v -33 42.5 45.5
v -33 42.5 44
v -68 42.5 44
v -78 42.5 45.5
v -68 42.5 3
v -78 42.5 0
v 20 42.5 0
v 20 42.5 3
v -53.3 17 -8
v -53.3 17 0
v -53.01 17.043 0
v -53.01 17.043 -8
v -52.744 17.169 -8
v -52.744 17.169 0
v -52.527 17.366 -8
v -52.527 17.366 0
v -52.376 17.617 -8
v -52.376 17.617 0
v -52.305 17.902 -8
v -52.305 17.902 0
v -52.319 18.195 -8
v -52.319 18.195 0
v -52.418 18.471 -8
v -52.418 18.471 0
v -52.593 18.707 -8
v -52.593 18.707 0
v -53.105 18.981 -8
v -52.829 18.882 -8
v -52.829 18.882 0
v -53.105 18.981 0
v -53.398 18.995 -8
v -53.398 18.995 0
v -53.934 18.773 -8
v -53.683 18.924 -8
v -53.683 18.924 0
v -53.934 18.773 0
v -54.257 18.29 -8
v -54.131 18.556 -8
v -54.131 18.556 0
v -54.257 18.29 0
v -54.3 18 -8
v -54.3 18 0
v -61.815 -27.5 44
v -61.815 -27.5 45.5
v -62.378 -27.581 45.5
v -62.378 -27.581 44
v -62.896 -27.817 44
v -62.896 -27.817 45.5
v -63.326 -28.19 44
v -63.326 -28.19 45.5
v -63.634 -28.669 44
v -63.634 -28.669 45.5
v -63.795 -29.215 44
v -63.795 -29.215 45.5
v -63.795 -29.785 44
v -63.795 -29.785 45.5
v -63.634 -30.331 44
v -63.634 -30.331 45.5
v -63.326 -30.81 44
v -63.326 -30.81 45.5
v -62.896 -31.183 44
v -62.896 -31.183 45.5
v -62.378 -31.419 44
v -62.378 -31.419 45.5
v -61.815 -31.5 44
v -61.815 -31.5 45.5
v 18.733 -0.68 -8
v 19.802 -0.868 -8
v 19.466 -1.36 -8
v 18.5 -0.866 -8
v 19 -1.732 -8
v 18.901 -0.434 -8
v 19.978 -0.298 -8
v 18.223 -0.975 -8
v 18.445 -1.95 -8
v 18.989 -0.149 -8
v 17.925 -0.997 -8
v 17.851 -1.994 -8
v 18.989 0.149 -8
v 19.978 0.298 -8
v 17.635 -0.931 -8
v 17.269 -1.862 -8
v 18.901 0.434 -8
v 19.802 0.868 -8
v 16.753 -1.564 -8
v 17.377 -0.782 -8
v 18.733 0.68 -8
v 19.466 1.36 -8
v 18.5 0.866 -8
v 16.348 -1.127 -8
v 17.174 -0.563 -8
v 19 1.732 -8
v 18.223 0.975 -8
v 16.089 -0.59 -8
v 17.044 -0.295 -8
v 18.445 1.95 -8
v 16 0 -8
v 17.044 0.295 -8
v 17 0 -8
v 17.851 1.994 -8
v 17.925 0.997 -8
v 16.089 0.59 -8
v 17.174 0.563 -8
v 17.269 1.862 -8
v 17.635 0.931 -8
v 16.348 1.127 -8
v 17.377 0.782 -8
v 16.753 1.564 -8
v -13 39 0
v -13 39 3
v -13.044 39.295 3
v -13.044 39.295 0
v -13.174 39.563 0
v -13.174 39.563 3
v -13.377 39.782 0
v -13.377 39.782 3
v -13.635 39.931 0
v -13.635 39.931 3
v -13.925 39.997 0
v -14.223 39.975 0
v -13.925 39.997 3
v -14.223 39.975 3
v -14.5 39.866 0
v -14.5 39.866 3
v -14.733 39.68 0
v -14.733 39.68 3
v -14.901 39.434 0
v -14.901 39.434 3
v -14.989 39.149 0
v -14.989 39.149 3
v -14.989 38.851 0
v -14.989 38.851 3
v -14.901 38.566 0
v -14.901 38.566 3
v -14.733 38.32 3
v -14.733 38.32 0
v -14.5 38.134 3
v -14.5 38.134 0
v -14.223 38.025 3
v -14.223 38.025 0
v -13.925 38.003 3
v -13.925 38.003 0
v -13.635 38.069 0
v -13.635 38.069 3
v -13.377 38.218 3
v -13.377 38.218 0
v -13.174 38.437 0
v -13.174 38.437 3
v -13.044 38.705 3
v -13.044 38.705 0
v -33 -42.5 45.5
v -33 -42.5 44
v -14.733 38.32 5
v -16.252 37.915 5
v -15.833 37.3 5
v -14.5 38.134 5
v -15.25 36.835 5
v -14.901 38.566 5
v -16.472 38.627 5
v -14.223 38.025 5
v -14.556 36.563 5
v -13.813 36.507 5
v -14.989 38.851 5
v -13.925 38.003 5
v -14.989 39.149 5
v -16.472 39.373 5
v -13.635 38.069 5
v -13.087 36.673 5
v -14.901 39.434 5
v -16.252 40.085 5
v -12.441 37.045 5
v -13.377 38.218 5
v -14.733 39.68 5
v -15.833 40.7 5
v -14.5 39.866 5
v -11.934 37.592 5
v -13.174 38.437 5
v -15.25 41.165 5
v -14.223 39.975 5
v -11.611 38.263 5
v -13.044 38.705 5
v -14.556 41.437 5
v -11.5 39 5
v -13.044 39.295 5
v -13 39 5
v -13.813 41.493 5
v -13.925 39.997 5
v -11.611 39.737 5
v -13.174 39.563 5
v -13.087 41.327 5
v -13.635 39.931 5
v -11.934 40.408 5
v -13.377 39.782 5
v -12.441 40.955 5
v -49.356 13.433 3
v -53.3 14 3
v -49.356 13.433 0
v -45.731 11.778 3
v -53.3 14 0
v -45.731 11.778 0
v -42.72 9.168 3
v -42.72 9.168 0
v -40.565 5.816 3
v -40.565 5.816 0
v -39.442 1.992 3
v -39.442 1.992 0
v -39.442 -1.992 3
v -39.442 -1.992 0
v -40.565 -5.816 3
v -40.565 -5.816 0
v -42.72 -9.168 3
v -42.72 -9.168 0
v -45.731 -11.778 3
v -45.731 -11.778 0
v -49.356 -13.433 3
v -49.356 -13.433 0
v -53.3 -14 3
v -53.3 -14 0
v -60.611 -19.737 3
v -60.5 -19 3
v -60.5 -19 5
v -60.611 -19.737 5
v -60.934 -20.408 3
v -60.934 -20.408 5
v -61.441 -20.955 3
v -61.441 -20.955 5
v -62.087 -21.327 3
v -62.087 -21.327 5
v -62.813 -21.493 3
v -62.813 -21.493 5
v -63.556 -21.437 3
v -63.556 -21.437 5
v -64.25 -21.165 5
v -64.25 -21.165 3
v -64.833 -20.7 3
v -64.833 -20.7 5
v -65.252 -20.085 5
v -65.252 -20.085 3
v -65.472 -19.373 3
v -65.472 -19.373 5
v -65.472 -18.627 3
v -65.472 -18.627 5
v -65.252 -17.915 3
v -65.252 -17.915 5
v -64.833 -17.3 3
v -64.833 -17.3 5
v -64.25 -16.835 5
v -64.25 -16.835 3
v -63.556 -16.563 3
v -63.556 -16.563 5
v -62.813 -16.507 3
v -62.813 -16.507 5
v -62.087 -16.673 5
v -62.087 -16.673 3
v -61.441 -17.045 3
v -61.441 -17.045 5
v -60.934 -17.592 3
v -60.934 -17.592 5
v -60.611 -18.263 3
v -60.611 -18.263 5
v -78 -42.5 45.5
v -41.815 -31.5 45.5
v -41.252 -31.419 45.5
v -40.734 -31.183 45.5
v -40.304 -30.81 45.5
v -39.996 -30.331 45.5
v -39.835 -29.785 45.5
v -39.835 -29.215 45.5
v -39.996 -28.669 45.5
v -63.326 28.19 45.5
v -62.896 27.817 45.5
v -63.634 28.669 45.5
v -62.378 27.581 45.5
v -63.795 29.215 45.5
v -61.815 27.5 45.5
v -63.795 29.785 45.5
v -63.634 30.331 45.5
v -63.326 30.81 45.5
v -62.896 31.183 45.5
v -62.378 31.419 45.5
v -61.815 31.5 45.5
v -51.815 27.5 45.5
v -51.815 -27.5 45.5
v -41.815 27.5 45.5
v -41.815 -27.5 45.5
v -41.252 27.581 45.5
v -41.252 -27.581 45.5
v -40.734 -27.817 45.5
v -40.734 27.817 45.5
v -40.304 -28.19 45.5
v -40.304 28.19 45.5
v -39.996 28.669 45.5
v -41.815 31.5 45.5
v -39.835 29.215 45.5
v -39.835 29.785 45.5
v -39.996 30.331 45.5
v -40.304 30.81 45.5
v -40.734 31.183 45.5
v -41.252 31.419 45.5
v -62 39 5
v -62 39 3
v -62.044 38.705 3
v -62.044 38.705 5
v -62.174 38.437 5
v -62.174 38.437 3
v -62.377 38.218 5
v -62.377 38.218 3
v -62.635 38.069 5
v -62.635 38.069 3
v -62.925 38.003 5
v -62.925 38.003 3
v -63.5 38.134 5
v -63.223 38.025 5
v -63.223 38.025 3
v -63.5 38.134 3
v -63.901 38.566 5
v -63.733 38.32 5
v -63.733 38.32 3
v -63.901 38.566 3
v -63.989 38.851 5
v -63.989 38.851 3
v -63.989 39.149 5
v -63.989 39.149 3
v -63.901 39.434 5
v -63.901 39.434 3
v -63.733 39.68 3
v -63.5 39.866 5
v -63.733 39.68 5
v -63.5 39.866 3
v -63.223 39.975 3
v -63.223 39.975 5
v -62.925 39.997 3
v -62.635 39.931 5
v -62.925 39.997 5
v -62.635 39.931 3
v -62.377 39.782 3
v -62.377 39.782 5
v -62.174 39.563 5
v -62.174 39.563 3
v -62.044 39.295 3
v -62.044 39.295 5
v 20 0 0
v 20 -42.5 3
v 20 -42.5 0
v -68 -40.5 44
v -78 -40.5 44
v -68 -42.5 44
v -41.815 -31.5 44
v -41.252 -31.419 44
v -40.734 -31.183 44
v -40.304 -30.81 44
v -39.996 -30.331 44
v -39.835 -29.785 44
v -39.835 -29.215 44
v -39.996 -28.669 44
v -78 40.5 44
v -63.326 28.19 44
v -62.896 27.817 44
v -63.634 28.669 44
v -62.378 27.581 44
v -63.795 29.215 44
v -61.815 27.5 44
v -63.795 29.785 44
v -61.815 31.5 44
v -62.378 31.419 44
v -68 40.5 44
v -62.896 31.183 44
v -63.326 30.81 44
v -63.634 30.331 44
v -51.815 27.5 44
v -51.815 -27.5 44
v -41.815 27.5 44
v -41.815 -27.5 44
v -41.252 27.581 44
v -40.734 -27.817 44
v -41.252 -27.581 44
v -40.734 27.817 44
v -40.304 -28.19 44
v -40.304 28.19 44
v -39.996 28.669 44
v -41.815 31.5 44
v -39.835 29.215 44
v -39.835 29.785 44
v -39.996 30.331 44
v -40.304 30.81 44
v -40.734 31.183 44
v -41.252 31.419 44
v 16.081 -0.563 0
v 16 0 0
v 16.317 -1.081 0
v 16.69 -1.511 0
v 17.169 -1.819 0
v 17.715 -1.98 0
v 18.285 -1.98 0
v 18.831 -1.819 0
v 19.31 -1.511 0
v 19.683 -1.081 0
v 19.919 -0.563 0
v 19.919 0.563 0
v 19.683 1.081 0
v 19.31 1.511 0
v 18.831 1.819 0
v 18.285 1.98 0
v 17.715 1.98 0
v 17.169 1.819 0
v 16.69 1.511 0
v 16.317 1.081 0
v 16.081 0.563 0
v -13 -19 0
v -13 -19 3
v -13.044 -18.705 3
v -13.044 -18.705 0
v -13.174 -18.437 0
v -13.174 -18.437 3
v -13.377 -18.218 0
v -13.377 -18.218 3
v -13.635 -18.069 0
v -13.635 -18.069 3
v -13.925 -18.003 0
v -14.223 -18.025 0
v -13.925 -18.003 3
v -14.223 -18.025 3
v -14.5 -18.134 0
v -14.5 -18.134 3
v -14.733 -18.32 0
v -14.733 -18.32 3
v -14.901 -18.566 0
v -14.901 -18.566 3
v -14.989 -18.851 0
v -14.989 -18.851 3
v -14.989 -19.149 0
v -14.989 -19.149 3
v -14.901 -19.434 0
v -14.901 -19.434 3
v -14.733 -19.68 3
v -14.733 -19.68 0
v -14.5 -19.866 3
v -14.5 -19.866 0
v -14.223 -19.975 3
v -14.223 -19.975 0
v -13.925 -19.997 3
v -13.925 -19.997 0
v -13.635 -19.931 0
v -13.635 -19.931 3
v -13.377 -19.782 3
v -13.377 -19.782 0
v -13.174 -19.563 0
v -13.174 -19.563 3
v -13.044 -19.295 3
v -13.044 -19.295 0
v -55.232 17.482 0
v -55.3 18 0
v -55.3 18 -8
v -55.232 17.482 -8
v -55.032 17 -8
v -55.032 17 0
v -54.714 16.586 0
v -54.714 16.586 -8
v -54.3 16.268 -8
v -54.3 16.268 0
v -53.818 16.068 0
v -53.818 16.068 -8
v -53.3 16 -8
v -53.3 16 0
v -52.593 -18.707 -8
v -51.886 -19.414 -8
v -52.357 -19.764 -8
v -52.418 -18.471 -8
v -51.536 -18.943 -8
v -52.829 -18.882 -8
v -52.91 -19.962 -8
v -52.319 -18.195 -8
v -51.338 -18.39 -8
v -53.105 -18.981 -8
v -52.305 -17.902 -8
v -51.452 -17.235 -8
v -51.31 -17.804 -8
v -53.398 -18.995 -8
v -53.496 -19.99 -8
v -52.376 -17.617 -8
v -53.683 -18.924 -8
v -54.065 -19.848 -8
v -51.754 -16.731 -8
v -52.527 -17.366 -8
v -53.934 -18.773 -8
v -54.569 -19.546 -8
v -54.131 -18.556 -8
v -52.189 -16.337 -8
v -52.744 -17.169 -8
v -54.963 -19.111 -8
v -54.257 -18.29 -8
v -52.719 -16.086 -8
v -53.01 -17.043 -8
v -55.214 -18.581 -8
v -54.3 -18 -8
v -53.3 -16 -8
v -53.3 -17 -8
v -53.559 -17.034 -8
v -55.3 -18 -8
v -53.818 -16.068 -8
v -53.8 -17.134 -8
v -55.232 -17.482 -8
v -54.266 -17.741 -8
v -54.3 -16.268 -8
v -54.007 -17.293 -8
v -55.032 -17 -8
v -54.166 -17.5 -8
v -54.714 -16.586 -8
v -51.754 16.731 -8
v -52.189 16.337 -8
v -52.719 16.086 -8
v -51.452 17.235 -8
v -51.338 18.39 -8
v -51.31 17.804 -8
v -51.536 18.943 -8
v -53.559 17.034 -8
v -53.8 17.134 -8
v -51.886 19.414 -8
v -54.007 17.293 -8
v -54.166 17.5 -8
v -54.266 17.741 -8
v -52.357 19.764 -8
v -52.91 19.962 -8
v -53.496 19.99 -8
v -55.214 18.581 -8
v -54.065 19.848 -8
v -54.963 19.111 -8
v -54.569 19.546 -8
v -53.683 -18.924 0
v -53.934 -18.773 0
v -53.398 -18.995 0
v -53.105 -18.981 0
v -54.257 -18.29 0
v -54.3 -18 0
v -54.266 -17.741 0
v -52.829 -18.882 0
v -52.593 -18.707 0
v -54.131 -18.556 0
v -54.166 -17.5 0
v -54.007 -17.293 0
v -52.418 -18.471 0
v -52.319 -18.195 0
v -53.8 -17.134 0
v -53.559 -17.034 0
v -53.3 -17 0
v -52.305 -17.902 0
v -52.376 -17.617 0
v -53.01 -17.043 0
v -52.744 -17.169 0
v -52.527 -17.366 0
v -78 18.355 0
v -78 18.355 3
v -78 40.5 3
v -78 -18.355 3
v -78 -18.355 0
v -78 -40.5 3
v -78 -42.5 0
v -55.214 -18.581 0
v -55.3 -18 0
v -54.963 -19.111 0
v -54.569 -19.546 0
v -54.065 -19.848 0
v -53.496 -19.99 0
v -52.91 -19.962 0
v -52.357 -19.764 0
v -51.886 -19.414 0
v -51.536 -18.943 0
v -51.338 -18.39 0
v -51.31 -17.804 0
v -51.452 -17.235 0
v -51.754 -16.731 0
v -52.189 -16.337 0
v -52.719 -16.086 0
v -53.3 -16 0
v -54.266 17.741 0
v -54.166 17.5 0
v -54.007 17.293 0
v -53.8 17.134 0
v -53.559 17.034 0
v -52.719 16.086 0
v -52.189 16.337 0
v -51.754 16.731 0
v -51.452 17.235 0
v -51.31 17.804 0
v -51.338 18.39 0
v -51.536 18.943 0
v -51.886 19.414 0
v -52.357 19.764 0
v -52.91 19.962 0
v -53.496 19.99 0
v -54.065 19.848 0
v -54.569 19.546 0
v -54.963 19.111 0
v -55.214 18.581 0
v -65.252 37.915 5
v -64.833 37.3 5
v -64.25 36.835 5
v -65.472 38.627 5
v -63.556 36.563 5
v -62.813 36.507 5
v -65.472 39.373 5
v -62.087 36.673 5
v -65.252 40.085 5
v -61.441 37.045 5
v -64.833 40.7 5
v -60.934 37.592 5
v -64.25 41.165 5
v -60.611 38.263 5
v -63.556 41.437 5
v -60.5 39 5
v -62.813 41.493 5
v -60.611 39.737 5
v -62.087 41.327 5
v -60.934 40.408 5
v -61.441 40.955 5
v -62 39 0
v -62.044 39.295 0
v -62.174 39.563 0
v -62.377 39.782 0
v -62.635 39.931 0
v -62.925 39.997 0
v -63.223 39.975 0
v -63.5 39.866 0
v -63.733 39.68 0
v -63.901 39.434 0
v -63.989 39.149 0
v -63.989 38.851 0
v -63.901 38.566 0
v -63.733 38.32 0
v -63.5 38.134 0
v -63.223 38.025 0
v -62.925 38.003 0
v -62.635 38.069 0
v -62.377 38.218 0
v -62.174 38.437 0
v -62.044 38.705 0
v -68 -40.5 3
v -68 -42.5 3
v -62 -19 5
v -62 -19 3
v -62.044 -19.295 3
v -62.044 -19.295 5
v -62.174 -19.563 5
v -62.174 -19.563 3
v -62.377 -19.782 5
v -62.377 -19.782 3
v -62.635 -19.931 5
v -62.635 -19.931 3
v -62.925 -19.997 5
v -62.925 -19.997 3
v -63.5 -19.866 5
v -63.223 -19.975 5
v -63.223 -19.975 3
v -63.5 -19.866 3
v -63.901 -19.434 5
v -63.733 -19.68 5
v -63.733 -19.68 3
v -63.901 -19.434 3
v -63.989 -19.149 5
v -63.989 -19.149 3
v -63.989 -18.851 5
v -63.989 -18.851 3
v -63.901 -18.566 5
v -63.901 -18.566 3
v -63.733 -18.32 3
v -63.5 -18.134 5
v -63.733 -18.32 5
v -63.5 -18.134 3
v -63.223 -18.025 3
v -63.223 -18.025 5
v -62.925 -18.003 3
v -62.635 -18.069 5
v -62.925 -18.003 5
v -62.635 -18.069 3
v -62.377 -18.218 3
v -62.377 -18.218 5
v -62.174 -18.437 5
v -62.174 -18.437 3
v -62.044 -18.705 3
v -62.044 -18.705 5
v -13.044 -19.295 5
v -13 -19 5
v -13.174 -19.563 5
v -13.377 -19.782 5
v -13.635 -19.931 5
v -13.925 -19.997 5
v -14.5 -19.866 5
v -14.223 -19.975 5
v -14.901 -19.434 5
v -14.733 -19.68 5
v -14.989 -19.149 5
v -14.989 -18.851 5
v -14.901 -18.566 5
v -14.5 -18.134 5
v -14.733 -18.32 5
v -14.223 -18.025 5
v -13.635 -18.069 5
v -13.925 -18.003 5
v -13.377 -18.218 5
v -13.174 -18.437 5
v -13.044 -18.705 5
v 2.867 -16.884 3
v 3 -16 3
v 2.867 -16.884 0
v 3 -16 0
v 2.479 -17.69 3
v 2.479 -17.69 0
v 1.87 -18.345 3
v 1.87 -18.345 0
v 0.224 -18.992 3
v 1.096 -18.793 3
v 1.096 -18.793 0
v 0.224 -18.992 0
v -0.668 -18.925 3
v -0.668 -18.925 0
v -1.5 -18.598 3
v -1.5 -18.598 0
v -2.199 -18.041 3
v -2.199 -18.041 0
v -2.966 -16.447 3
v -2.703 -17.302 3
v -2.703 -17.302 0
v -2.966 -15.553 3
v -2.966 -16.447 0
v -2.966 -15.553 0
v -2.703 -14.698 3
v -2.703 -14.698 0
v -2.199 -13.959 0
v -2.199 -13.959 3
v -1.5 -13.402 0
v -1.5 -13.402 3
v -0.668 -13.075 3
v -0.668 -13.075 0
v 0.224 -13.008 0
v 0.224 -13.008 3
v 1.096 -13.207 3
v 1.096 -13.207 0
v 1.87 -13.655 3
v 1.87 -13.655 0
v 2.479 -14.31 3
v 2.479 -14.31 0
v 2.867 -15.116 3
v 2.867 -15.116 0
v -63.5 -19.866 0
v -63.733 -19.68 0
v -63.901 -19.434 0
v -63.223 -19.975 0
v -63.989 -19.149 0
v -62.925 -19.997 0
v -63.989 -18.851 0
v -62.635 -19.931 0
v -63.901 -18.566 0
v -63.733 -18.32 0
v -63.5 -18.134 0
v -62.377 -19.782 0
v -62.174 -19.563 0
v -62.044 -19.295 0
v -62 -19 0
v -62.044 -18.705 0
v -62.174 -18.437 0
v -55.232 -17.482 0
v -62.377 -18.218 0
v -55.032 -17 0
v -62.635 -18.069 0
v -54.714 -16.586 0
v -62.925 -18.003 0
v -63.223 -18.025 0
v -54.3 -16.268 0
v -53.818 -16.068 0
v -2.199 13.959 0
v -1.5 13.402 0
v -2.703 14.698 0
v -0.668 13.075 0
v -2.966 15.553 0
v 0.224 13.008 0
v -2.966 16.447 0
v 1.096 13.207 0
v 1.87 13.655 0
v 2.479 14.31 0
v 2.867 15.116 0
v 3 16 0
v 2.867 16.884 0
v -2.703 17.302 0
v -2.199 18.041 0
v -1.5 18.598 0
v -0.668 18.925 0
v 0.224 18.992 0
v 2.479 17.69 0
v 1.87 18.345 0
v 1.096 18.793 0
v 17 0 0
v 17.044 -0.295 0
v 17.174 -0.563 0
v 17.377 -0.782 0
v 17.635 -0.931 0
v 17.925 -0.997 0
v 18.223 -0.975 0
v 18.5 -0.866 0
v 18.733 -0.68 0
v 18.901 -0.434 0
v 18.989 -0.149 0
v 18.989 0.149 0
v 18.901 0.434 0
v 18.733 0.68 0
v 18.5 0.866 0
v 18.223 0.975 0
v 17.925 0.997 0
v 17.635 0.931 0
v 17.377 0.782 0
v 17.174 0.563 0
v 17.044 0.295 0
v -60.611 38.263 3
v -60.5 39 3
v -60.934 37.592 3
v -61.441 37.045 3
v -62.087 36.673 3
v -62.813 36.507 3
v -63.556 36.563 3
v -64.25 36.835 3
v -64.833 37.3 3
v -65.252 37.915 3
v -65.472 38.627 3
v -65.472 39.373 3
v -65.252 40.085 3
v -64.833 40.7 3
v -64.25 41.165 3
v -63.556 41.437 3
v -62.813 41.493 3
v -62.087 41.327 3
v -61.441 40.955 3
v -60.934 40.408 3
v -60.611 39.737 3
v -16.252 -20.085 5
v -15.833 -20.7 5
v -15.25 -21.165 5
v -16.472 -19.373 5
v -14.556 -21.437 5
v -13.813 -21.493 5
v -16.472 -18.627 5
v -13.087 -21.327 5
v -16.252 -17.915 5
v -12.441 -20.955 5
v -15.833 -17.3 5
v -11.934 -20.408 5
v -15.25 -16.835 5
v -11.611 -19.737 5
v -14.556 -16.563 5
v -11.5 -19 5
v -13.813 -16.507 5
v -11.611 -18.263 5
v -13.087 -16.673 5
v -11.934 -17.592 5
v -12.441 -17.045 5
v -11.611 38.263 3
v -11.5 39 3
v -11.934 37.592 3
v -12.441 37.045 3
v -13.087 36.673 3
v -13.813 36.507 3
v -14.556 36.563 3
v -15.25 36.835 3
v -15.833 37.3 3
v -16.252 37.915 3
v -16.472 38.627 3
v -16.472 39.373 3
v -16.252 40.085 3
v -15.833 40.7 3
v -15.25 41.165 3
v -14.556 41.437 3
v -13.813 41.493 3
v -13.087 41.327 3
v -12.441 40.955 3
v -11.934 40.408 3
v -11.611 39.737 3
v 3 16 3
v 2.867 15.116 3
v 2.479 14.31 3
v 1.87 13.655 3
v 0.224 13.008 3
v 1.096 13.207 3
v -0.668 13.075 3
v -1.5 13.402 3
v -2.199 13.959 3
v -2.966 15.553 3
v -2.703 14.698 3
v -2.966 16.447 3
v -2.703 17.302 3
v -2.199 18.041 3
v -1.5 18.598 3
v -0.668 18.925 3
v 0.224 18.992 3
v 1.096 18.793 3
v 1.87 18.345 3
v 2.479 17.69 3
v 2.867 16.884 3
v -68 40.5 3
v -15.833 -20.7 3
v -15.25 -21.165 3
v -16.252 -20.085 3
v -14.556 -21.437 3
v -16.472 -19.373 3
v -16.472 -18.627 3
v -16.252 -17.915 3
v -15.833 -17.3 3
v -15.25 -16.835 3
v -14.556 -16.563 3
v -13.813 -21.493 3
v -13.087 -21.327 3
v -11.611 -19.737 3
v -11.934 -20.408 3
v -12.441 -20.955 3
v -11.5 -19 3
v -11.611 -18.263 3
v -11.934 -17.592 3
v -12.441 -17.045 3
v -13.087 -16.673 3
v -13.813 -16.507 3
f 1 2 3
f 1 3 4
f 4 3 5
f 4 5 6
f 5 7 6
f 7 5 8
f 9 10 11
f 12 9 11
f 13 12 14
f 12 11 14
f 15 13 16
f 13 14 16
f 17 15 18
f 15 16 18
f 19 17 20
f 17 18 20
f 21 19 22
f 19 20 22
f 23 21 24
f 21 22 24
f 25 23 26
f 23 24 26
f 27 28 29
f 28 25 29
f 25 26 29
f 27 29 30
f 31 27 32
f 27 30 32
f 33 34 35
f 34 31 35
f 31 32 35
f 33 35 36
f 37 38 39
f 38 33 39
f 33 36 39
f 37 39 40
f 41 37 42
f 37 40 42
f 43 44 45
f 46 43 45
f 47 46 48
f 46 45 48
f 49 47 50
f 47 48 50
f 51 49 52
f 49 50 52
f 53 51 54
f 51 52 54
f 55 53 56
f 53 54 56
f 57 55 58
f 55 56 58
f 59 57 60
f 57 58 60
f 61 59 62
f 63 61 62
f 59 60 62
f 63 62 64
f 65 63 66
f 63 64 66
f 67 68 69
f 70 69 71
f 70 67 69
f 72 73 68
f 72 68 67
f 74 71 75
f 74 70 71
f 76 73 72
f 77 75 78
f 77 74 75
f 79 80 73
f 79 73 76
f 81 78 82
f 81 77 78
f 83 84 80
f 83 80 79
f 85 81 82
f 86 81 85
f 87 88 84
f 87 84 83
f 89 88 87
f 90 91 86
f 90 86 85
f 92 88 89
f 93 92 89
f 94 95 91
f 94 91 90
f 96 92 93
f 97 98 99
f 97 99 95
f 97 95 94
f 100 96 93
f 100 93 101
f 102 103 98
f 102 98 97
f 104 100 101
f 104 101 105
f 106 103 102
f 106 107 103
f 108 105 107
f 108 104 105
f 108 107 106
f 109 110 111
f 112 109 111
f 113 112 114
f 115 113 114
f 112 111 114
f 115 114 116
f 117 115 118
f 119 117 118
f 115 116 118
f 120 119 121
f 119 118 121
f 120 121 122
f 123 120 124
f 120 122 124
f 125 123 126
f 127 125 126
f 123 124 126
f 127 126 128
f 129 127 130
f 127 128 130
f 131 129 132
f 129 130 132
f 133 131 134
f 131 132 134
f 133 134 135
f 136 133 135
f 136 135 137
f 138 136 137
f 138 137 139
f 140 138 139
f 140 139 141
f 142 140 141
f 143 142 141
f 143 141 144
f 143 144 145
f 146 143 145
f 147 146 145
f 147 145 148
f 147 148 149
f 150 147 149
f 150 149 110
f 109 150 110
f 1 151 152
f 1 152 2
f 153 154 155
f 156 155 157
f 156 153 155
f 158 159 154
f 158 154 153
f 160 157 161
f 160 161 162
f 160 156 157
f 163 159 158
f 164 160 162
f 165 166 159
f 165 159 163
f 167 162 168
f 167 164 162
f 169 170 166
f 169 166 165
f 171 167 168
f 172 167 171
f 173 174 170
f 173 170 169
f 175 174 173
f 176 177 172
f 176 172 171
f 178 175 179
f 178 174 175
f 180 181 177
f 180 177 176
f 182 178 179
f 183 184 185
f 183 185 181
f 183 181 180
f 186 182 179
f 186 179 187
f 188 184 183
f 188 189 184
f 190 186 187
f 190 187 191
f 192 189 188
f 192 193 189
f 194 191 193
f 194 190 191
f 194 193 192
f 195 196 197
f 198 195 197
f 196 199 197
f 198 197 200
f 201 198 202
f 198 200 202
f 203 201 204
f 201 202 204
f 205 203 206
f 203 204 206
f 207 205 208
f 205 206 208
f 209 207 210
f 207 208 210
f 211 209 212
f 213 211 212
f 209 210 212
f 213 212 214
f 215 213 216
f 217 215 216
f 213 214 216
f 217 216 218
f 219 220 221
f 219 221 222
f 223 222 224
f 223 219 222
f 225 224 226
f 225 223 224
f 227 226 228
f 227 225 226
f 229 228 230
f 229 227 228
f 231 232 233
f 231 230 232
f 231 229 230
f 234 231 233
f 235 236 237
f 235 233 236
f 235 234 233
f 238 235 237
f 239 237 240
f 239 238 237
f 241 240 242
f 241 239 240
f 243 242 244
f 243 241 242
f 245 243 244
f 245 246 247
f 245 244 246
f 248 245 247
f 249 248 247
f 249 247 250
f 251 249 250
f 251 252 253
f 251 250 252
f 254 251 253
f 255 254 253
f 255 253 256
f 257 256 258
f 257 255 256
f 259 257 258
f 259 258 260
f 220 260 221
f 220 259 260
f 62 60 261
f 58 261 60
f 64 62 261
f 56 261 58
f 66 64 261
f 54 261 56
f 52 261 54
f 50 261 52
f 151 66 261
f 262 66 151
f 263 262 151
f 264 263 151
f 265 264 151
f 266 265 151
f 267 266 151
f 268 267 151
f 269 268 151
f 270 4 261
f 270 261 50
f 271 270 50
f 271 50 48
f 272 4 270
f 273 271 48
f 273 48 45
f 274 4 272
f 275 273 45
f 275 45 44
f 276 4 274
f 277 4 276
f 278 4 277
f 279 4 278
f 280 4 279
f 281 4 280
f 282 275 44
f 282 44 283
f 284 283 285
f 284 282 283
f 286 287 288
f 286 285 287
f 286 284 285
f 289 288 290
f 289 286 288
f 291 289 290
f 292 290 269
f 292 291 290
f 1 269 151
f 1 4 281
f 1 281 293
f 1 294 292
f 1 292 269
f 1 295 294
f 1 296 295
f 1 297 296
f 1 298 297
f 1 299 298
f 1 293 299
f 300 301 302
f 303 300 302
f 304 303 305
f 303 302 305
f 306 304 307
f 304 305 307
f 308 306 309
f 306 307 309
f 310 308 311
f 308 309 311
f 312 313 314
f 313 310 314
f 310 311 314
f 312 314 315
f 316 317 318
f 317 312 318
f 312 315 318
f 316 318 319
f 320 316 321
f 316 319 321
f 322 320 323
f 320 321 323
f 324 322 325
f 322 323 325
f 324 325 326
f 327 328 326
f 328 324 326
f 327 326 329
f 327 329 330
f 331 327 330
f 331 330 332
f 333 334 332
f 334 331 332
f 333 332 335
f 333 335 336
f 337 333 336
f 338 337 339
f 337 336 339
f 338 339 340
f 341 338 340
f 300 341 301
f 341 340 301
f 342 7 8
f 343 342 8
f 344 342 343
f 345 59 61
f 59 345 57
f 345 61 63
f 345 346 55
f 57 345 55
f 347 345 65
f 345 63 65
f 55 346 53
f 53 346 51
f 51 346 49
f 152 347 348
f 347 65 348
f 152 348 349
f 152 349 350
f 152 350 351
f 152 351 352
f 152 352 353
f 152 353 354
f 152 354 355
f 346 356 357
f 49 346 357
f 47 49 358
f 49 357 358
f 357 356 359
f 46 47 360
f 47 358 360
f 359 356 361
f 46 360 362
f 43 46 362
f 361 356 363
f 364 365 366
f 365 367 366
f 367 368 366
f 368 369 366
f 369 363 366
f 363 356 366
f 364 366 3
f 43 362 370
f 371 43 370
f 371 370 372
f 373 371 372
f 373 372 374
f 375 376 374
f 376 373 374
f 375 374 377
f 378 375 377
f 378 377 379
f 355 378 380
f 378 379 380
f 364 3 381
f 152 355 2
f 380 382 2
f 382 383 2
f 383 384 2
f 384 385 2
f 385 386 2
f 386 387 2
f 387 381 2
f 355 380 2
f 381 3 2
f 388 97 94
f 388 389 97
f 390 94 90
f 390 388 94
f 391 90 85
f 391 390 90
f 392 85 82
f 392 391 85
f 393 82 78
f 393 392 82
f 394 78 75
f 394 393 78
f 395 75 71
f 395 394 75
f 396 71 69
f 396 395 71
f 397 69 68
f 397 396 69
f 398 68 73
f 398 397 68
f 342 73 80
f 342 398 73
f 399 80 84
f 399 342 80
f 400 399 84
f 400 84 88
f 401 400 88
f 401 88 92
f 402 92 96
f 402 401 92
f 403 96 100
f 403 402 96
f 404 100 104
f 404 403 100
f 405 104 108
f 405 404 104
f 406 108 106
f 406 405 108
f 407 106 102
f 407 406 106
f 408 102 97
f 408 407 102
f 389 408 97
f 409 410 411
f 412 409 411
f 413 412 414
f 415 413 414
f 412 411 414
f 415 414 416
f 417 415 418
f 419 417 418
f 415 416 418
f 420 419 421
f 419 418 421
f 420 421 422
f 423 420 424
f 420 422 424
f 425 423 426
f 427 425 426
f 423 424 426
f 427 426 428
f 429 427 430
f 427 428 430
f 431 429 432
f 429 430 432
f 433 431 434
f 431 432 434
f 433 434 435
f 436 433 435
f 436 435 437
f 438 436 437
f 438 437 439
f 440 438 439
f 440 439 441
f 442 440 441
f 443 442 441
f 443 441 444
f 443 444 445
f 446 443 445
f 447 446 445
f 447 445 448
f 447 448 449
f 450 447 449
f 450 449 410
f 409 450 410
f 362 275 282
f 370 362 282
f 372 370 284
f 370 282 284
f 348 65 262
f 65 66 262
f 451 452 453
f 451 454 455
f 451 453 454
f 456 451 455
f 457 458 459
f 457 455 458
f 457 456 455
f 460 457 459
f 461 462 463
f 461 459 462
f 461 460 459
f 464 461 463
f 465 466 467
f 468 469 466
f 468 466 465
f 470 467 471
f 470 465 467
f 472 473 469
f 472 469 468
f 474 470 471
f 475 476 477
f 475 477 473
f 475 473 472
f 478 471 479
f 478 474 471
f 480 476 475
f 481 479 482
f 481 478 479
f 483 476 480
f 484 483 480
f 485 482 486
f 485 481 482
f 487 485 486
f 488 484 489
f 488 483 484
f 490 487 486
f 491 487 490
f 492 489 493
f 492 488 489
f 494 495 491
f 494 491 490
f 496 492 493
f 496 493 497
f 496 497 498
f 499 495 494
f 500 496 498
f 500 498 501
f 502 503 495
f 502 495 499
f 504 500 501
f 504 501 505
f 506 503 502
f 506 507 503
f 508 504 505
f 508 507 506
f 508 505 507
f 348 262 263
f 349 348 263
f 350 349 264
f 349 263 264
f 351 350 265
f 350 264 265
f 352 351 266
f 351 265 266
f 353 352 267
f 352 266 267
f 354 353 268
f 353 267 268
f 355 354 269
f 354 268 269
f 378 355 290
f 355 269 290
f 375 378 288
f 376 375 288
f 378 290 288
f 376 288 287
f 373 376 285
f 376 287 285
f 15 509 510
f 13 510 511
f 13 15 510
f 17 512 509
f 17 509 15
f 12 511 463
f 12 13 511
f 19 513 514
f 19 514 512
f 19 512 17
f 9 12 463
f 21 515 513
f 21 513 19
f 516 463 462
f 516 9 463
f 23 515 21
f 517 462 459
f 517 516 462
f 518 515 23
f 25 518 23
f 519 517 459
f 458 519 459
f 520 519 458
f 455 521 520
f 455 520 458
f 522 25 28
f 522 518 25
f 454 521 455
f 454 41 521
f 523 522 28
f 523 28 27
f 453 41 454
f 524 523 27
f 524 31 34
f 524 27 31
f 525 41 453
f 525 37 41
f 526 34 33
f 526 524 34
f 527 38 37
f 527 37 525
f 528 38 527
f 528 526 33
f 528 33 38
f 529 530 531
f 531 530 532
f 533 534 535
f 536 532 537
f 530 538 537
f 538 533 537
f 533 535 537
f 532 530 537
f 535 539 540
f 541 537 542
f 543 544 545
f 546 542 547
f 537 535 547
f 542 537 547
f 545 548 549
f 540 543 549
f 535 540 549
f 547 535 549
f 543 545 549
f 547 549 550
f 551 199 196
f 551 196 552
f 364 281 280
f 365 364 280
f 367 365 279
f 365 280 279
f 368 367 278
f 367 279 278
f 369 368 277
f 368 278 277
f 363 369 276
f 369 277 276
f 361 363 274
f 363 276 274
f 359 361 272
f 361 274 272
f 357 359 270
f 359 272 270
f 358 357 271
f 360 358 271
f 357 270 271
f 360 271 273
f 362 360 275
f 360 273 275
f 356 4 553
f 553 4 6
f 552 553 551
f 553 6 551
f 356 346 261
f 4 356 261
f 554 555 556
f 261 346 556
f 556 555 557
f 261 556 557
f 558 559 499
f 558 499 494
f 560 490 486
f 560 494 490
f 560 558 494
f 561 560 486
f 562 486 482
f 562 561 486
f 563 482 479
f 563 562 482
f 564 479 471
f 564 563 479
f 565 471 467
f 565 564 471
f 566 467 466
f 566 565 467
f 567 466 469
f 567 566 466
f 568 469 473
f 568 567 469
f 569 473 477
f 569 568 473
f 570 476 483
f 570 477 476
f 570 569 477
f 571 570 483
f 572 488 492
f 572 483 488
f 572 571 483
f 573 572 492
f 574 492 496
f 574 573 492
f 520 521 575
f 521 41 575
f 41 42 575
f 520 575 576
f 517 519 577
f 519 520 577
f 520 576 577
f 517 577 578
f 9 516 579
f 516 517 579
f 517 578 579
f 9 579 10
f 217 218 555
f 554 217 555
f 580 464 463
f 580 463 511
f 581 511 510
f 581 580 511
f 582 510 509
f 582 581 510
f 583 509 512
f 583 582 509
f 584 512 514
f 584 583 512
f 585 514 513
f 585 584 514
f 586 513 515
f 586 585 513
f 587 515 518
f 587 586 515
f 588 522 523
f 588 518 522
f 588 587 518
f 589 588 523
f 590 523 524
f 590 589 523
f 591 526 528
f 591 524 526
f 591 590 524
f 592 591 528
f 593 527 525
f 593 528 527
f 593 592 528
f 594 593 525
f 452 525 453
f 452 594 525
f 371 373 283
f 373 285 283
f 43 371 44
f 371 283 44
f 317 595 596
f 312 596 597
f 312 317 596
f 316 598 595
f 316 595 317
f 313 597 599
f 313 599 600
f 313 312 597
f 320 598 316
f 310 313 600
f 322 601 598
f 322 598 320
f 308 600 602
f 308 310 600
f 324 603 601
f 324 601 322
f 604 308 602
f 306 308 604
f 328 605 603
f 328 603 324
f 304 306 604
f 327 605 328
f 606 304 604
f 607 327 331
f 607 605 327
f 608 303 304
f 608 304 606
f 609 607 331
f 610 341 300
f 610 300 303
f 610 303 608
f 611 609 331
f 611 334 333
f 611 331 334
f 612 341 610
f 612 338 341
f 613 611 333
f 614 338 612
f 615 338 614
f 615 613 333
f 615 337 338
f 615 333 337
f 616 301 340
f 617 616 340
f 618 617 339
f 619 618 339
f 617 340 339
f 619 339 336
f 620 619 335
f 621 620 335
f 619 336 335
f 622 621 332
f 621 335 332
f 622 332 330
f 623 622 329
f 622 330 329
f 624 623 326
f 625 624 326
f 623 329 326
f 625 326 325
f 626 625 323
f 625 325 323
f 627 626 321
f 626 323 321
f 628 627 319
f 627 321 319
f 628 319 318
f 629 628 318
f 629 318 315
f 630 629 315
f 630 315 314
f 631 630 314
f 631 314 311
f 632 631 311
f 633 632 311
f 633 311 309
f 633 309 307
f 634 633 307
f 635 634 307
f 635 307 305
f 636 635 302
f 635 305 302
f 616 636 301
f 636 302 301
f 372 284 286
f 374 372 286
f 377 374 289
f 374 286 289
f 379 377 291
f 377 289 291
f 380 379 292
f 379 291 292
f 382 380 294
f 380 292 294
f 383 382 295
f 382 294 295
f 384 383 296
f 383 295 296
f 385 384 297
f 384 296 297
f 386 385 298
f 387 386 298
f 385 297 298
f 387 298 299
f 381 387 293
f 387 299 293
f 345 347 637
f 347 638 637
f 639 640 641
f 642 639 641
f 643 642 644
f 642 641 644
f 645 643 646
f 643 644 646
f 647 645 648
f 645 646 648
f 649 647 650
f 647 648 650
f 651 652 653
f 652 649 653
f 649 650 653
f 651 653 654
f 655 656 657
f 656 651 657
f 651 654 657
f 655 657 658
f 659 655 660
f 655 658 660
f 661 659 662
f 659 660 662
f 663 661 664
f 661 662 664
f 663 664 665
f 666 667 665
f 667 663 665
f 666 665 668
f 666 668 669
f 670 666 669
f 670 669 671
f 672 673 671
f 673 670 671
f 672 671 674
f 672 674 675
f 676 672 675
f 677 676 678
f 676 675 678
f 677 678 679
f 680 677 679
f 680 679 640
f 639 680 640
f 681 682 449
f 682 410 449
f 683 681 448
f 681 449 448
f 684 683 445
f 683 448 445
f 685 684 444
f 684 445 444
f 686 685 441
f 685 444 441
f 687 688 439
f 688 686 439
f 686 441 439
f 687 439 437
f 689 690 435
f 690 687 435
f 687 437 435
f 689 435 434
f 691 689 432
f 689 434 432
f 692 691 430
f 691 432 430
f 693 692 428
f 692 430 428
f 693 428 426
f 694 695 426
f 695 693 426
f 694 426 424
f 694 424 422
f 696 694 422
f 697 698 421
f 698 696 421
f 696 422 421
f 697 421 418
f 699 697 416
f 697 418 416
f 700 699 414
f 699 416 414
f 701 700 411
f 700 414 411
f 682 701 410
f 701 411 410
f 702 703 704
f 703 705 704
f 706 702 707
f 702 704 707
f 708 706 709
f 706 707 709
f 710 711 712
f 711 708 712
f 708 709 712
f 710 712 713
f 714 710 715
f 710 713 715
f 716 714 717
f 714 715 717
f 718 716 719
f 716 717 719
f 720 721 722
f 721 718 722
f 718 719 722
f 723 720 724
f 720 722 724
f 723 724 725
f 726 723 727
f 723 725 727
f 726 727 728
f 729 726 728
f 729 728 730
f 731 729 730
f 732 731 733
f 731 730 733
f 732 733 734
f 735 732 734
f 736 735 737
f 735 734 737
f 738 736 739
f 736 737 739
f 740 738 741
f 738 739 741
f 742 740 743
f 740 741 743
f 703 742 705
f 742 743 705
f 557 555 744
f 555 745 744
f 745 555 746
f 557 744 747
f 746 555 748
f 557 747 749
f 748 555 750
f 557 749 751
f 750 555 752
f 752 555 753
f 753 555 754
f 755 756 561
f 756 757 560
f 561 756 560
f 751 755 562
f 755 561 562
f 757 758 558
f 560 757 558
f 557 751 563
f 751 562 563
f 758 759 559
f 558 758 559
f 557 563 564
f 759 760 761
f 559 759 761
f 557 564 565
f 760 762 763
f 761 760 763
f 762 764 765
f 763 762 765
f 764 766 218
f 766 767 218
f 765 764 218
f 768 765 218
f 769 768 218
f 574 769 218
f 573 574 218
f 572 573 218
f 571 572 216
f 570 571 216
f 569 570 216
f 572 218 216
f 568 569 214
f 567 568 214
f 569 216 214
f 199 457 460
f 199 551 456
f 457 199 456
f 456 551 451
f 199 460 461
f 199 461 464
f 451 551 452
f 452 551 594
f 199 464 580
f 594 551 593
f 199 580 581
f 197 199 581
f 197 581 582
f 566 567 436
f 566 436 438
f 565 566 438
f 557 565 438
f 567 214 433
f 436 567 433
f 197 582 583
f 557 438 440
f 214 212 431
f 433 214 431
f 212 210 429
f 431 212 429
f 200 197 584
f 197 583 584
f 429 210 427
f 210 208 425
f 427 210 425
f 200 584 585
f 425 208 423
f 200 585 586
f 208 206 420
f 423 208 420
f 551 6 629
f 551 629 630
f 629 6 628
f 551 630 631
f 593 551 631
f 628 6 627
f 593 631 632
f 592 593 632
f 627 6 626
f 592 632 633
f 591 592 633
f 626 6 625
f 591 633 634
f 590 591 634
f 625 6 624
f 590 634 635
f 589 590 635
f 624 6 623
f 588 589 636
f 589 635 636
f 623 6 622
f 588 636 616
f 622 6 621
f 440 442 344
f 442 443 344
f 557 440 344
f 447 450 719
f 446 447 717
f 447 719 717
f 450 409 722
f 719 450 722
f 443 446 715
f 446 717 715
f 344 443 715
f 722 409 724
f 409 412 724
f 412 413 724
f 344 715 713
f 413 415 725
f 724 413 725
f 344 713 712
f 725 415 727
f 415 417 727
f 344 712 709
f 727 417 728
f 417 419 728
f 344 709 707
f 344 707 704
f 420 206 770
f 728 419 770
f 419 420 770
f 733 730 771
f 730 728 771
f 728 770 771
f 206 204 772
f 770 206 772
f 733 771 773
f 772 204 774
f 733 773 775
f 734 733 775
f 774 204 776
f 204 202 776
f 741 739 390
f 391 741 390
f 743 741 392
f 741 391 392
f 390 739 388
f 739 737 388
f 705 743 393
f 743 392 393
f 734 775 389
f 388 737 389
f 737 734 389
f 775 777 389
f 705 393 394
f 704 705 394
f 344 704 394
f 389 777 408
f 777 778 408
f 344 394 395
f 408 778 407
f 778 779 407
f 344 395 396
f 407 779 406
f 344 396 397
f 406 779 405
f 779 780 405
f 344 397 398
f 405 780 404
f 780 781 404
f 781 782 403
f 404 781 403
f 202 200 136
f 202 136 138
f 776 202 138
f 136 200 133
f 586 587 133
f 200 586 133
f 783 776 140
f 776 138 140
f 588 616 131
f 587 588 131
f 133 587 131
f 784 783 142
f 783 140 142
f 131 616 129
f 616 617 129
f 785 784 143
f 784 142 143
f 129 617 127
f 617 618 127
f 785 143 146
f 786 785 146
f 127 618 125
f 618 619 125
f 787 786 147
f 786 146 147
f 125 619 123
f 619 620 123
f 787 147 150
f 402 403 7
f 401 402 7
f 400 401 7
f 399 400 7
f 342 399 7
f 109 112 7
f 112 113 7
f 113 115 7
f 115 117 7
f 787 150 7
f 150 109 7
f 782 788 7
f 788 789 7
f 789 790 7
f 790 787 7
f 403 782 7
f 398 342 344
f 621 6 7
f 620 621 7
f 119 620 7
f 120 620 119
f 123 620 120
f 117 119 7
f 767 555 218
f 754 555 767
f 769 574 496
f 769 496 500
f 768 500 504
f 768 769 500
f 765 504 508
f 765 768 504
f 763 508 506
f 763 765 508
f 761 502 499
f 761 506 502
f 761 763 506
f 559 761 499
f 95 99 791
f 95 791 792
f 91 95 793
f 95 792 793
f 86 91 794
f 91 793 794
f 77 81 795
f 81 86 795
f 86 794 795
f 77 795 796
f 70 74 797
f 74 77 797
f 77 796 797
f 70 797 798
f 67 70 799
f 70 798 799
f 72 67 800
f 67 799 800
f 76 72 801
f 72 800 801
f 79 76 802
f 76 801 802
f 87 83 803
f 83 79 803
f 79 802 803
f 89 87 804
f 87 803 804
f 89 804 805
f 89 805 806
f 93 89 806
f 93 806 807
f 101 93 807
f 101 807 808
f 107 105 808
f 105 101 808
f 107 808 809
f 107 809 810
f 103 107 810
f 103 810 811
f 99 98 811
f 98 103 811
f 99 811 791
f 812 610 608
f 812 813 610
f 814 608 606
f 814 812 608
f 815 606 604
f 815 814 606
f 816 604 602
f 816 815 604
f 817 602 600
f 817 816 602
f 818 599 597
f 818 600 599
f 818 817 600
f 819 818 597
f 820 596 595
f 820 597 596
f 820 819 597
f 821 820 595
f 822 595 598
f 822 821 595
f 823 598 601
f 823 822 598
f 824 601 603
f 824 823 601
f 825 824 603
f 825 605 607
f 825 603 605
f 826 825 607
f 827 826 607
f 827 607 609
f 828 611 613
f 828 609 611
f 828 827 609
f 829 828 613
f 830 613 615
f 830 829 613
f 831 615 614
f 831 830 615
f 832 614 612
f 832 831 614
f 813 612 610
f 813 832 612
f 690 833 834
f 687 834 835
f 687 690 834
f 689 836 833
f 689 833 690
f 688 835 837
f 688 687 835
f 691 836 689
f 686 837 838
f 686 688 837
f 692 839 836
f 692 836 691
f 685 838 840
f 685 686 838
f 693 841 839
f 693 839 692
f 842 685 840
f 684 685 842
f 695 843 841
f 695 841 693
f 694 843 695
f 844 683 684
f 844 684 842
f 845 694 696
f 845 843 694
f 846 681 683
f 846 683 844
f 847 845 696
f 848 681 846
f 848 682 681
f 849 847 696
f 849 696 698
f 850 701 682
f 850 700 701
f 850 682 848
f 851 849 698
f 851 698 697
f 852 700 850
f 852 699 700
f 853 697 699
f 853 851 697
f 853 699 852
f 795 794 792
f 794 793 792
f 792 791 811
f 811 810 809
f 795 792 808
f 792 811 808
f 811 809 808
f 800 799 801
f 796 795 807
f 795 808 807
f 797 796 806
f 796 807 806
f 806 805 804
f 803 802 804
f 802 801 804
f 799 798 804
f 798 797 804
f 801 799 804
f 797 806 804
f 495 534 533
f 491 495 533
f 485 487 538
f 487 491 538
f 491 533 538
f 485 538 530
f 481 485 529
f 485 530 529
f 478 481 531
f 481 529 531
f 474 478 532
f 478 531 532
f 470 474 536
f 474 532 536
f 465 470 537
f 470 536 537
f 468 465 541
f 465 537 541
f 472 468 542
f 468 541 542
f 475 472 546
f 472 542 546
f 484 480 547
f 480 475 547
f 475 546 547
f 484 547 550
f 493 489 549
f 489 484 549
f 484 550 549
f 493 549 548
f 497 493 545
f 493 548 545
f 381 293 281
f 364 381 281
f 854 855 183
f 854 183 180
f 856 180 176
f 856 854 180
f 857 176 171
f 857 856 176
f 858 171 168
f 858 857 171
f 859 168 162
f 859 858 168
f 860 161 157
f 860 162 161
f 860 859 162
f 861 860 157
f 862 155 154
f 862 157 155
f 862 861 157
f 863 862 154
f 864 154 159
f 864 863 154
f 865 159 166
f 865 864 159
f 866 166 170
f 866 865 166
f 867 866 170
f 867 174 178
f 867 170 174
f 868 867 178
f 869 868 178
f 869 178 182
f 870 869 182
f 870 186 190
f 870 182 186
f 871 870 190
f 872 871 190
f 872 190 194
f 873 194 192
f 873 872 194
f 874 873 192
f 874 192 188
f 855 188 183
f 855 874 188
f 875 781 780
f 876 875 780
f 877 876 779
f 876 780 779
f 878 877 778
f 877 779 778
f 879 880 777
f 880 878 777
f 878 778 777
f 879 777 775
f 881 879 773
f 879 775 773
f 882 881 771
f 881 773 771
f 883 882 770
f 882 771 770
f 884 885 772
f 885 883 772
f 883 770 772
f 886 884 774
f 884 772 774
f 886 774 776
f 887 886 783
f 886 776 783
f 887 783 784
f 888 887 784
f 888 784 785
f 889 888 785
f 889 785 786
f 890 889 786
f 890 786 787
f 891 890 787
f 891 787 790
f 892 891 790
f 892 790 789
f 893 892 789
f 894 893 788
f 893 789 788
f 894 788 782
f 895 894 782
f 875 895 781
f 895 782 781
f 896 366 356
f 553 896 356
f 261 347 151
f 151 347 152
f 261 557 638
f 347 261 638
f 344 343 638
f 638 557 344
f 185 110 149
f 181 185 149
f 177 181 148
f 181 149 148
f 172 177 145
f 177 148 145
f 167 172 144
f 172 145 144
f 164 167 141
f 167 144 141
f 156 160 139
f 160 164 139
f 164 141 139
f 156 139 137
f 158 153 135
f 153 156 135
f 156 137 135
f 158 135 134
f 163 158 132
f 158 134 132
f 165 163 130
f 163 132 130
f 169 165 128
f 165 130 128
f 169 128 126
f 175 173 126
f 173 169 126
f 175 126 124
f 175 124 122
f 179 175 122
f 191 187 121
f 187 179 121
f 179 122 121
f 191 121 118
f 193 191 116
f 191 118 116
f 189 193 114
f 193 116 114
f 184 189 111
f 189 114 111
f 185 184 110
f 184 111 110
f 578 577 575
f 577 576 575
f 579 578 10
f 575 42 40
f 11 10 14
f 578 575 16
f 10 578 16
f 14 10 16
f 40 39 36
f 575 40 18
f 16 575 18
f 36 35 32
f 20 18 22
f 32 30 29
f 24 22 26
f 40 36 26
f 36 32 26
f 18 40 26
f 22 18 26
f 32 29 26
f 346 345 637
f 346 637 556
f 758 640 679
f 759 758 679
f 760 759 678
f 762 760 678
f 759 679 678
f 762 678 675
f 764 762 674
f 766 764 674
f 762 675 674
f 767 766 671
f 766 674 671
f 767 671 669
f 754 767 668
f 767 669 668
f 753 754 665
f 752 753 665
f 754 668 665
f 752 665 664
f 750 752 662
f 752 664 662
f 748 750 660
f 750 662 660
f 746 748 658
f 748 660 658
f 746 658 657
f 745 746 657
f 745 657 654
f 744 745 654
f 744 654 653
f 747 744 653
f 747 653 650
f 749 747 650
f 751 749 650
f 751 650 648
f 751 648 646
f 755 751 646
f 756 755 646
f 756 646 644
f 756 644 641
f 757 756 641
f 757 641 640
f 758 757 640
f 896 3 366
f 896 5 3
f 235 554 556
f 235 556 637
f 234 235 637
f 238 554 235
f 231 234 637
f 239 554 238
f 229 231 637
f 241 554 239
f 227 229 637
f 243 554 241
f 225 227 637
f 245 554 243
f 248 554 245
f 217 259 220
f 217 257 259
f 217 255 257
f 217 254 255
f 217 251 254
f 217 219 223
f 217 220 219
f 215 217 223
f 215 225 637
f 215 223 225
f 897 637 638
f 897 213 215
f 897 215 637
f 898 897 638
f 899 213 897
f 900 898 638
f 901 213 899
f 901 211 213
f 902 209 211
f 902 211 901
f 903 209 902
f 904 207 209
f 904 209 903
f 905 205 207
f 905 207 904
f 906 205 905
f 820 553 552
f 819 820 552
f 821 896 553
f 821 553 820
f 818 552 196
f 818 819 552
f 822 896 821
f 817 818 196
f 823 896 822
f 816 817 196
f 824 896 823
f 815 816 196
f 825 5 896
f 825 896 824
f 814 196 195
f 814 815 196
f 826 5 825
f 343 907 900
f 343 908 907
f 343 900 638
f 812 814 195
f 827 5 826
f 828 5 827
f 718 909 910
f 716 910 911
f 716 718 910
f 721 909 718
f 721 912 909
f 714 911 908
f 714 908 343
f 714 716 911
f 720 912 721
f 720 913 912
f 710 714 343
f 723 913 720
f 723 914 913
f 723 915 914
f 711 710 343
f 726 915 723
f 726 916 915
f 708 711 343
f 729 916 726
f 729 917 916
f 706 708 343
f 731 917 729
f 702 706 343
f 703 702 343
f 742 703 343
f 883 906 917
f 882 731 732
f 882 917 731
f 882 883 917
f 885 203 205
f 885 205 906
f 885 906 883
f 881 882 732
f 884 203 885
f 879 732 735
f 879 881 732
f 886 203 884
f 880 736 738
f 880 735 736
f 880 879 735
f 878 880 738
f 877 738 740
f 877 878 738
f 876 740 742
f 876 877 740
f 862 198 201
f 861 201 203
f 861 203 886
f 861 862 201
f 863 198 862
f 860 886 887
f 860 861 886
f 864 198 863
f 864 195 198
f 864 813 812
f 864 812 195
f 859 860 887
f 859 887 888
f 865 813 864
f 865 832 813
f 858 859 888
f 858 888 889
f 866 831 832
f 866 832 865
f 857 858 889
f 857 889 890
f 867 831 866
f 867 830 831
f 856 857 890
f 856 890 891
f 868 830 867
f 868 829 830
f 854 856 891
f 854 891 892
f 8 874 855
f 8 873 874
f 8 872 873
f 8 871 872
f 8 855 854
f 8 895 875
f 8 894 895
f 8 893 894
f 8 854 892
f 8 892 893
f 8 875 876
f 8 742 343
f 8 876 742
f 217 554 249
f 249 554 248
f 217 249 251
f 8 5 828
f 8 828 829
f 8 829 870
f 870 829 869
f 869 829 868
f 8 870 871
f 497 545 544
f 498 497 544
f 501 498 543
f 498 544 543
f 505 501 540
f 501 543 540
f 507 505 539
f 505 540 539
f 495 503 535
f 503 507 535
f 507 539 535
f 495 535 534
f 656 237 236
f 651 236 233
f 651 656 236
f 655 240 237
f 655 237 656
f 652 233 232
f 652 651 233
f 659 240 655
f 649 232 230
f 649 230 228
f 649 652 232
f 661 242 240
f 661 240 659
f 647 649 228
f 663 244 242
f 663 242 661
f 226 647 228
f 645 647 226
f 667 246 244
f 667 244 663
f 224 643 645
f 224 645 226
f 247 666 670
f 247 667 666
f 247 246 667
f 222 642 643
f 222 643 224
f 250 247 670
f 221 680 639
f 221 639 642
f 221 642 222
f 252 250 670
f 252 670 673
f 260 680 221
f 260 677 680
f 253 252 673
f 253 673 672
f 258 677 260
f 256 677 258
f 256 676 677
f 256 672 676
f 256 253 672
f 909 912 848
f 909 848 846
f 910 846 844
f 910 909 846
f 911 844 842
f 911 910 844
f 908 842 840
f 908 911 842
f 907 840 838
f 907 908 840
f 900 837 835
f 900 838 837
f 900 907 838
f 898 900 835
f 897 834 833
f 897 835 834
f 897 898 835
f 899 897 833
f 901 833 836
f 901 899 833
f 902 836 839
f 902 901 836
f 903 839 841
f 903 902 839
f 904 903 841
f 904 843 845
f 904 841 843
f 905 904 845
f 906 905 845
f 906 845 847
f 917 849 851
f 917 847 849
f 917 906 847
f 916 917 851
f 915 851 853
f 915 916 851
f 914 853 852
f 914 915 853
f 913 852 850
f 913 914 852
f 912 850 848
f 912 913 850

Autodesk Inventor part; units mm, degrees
ref_plane "YZ Plane" through (0, 0, 0) normal (1, 0, 0) x (0, 1, 0)
ref_plane "XZ Plane" through (0, 0, 0) normal (0, 1, 0) x (-1, 0, 0)
ref_plane "XY Plane" through (0, 0, 0) normal (0, 0, 1) x (1, 0, 0)
sketch "Szkic1" plane through (0, 0, 0) normal (0, 0, 1) x (1, 0, 0)
  circle A0 centre (0, 16) radius 3
  circle A1 centre (0, -16) radius 3
  line L0 (0, 0) -> (20, 0)
  line L1 (20, 0) -> (20, -42.5)
  line L2 (20, 0) -> (20, 42.5)
  line L3 (20, 0) -> (62.5, 0) construction
  line L4 (20, 42.5) -> (-78, 42.5)
  line L5 (-78, 42.5) -> (-78, -42.5)
  line L6 (-78, -42.5) -> (20, -42.5)
  dimension "d0" = 6
  dimension "d1" = 6
  dimension "d5" = 20
  dimension "d6" = 42.5
  dimension "d7" = 42.5
  dimension "d8" = 90
  dimension "d9" = 98
  dimension "d10" = 85
  dimension "d11" = 90
extrude "Wyciągnięcie proste1" add sketch "Szkic1" along normal blind 3
sketch "Szkic2" plane through (0, 0, 3) normal (0, 0, 1) x (1, 0, 0)
  line L0 (-78, -42.5) -> (20, -42.5) projected
  line L1 (-10, 42.5) -> (10, 42.5)
  line L2 (10, 42.5) -> (10, -42.5)
  line L3 (10, -42.5) -> (-10, -42.5)
  line L4 (-10, -42.5) -> (-10, 42.5)
  line L5 (-10, 42.5) -> (10, -42.5) construction
  line L6 (10, 42.5) -> (-10, -42.5) construction
  circle A0 centre (-14, 39) radius 1
  circle A1 centre (-14, 39) radius 2.5
  circle A2 centre (-63, 39) radius 2.5
  circle A3 centre (-63, 39) radius 1
  circle A4 centre (-14, -19) radius 2.5
  circle A5 centre (-14, -19) radius 1
  circle A6 centre (-63, -19) radius 2.5
  circle A7 centre (-63, -19) radius 1
  line L7 (10, 42.5) -> (14, 42.5)
  line L8 (14, 42.5) -> (14, -42.5)
  line L9 (14, -42.5) -> (10, -42.5)
  line L10 (10, -42.5) -> (10, 42.5)
  point P0 (0, 0)
  dimension "d14" = 20
  dimension "d15" = 2
  dimension "d16" = 1.5
  dimension "d19" = 49
  dimension "d22" = 58
  dimension "d25" = 4
extrude "Wyciągnięcie proste2" add sketch "Szkic2" along normal blind 2 contours A1 | A2 | A4 | A6
extrude "Wyciągnięcie proste3" cut sketch "Szkic2" against normal blind 3 contours A0 | A3 | A5 | A7
sketch "Szkic4" plane through (0, 0, 3) normal (0, 0, 1) x (1, 0, 0)
  line L0 (-78, 42.5) -> (-78, -42.5) projected
  line L1 (-78, -42.5) -> (-68, -42.5)
  line L2 (-68, -42.5) -> (-68, -40.5)
  line L3 (-68, -40.5) -> (-78, -40.5)
  line L4 (-78, -40.5) -> (-78, -42.5)
  line L5 (-78, 42.5) -> (-68, 42.5)
  line L6 (-68, 42.5) -> (-68, 40.5)
  line L7 (-68, 40.5) -> (-78, 40.5)
  line L8 (-78, 40.5) -> (-78, 42.5)
  point P0 (0, 0)
  dimension "d31" = 10
  dimension "d32" = 2
  dimension "d33" = 10
  dimension "d34" = 2
extrude "Wyciągnięcie proste4" add sketch "Szkic4" along normal blind 42.5
sketch "Szkic5" plane through (0, 0, 45.5) normal (0, 0, 1) x (1, 0, 0)
  line L0 (-78, -42.5) -> (20, -42.5) projected
  line L1 (20, 42.5) -> (-78, 42.5) projected
  line L2 (-78, -42.5) -> (-33, -42.5)
  line L3 (-33, -42.5) -> (-33, 42.5)
  line L4 (-33, 42.5) -> (-78, 42.5)
  line L5 (-78, 42.5) -> (-78, -42.5)
  line L6 (-51.815, 0) -> (-51.815, 29.5)
  line L7 (-51.815, 29.5) -> (-51.815, -29.5)
  line L8 (-41.815, -29.5) -> (-61.815, -29.5) construction
  line L9 (-41.815, -27.5) -> (-61.815, -27.5)
  line L10 (-61.815, -31.5) -> (-41.815, -31.5)
  arc A0 (-41.815, -31.5) -> (-41.815, -27.5) centre (-41.815, -29.5) ccw
  arc A1 (-61.815, -27.5) -> (-61.815, -31.5) centre (-61.815, -29.5) ccw
  line L11 (-41.815, 29.5) -> (-61.815, 29.5) construction
  line L12 (-41.815, 31.5) -> (-61.815, 31.5)
  line L13 (-61.815, 27.5) -> (-41.815, 27.5)
  arc A2 (-41.815, 27.5) -> (-41.815, 31.5) centre (-41.815, 29.5) ccw
  arc A3 (-61.815, 31.5) -> (-61.815, 27.5) centre (-61.815, 29.5) ccw
  point P0 (0, 0)
  dimension "d37" = 45
  dimension "d38" = 29.5
  dimension "d39" = 59
  dimension "d40" = 10
  dimension "d41" = 4
  dimension "d42" = 4
extrude "Wyciągnięcie proste5" add sketch "Szkic5" against normal blind 1.5
sketch "Szkic6" plane through (0, 0, 0) normal (0, 0, -1) x (-1, 0, 0)
  circle A0 centre (-18, 0) radius 2
  circle A1 centre (-18, 0) radius 1
  line L0 (-18, 0) -> (53.3, 0)
  line L1 (53.3, 0) -> (53.3, 18)
  line L2 (53.3, 0) -> (53.3, -18)
  circle A2 centre (53.3, -18) radius 1
  circle A3 centre (53.3, -18) radius 2
  circle A4 centre (53.3, 18) radius 1
  circle A5 centre (53.3, 18) radius 2
  arc A6 (53.3, 14) -> (53.3, -14) centre (53.3, 0) ccw
  line L3 (53.3, -14) -> (78, -18.3553)
  line L4 (78, 40.5) -> (78, -40.5) projected
  line L5 (53.3, -14) -> (78.381, -14) construction
  line L6 (53.3, 14) -> (78, 18.3553)
  line L7 (53.3, 14) -> (78.381, 14) construction
  line L8 (78, 18.3553) -> (78, -18.3553)
  point P0 (0, 0)
  dimension "d45" = 2
  dimension "d46" = 71.3
  dimension "d47" = 18
  dimension "d48" = 18
  dimension "d49" = 2
  dimension "d50" = 4
  dimension "d51" = 2
  dimension "d52" = 4
  dimension "d53" = 14
  dimension "d54" = 10
  dimension "d55" = 10
extrude "Wyciągnięcie proste6" add sketch "Szkic6" along normal blind 8 contours A0 | A5 | A3
extrude "Wyciągnięcie proste7" cut sketch "Szkic6" against normal blind 3 contours A6 L1 L0 | L0 L2 A6 | L1 L6 L4 L3 L2
properties part number "RP4_LidarHolderv3"
